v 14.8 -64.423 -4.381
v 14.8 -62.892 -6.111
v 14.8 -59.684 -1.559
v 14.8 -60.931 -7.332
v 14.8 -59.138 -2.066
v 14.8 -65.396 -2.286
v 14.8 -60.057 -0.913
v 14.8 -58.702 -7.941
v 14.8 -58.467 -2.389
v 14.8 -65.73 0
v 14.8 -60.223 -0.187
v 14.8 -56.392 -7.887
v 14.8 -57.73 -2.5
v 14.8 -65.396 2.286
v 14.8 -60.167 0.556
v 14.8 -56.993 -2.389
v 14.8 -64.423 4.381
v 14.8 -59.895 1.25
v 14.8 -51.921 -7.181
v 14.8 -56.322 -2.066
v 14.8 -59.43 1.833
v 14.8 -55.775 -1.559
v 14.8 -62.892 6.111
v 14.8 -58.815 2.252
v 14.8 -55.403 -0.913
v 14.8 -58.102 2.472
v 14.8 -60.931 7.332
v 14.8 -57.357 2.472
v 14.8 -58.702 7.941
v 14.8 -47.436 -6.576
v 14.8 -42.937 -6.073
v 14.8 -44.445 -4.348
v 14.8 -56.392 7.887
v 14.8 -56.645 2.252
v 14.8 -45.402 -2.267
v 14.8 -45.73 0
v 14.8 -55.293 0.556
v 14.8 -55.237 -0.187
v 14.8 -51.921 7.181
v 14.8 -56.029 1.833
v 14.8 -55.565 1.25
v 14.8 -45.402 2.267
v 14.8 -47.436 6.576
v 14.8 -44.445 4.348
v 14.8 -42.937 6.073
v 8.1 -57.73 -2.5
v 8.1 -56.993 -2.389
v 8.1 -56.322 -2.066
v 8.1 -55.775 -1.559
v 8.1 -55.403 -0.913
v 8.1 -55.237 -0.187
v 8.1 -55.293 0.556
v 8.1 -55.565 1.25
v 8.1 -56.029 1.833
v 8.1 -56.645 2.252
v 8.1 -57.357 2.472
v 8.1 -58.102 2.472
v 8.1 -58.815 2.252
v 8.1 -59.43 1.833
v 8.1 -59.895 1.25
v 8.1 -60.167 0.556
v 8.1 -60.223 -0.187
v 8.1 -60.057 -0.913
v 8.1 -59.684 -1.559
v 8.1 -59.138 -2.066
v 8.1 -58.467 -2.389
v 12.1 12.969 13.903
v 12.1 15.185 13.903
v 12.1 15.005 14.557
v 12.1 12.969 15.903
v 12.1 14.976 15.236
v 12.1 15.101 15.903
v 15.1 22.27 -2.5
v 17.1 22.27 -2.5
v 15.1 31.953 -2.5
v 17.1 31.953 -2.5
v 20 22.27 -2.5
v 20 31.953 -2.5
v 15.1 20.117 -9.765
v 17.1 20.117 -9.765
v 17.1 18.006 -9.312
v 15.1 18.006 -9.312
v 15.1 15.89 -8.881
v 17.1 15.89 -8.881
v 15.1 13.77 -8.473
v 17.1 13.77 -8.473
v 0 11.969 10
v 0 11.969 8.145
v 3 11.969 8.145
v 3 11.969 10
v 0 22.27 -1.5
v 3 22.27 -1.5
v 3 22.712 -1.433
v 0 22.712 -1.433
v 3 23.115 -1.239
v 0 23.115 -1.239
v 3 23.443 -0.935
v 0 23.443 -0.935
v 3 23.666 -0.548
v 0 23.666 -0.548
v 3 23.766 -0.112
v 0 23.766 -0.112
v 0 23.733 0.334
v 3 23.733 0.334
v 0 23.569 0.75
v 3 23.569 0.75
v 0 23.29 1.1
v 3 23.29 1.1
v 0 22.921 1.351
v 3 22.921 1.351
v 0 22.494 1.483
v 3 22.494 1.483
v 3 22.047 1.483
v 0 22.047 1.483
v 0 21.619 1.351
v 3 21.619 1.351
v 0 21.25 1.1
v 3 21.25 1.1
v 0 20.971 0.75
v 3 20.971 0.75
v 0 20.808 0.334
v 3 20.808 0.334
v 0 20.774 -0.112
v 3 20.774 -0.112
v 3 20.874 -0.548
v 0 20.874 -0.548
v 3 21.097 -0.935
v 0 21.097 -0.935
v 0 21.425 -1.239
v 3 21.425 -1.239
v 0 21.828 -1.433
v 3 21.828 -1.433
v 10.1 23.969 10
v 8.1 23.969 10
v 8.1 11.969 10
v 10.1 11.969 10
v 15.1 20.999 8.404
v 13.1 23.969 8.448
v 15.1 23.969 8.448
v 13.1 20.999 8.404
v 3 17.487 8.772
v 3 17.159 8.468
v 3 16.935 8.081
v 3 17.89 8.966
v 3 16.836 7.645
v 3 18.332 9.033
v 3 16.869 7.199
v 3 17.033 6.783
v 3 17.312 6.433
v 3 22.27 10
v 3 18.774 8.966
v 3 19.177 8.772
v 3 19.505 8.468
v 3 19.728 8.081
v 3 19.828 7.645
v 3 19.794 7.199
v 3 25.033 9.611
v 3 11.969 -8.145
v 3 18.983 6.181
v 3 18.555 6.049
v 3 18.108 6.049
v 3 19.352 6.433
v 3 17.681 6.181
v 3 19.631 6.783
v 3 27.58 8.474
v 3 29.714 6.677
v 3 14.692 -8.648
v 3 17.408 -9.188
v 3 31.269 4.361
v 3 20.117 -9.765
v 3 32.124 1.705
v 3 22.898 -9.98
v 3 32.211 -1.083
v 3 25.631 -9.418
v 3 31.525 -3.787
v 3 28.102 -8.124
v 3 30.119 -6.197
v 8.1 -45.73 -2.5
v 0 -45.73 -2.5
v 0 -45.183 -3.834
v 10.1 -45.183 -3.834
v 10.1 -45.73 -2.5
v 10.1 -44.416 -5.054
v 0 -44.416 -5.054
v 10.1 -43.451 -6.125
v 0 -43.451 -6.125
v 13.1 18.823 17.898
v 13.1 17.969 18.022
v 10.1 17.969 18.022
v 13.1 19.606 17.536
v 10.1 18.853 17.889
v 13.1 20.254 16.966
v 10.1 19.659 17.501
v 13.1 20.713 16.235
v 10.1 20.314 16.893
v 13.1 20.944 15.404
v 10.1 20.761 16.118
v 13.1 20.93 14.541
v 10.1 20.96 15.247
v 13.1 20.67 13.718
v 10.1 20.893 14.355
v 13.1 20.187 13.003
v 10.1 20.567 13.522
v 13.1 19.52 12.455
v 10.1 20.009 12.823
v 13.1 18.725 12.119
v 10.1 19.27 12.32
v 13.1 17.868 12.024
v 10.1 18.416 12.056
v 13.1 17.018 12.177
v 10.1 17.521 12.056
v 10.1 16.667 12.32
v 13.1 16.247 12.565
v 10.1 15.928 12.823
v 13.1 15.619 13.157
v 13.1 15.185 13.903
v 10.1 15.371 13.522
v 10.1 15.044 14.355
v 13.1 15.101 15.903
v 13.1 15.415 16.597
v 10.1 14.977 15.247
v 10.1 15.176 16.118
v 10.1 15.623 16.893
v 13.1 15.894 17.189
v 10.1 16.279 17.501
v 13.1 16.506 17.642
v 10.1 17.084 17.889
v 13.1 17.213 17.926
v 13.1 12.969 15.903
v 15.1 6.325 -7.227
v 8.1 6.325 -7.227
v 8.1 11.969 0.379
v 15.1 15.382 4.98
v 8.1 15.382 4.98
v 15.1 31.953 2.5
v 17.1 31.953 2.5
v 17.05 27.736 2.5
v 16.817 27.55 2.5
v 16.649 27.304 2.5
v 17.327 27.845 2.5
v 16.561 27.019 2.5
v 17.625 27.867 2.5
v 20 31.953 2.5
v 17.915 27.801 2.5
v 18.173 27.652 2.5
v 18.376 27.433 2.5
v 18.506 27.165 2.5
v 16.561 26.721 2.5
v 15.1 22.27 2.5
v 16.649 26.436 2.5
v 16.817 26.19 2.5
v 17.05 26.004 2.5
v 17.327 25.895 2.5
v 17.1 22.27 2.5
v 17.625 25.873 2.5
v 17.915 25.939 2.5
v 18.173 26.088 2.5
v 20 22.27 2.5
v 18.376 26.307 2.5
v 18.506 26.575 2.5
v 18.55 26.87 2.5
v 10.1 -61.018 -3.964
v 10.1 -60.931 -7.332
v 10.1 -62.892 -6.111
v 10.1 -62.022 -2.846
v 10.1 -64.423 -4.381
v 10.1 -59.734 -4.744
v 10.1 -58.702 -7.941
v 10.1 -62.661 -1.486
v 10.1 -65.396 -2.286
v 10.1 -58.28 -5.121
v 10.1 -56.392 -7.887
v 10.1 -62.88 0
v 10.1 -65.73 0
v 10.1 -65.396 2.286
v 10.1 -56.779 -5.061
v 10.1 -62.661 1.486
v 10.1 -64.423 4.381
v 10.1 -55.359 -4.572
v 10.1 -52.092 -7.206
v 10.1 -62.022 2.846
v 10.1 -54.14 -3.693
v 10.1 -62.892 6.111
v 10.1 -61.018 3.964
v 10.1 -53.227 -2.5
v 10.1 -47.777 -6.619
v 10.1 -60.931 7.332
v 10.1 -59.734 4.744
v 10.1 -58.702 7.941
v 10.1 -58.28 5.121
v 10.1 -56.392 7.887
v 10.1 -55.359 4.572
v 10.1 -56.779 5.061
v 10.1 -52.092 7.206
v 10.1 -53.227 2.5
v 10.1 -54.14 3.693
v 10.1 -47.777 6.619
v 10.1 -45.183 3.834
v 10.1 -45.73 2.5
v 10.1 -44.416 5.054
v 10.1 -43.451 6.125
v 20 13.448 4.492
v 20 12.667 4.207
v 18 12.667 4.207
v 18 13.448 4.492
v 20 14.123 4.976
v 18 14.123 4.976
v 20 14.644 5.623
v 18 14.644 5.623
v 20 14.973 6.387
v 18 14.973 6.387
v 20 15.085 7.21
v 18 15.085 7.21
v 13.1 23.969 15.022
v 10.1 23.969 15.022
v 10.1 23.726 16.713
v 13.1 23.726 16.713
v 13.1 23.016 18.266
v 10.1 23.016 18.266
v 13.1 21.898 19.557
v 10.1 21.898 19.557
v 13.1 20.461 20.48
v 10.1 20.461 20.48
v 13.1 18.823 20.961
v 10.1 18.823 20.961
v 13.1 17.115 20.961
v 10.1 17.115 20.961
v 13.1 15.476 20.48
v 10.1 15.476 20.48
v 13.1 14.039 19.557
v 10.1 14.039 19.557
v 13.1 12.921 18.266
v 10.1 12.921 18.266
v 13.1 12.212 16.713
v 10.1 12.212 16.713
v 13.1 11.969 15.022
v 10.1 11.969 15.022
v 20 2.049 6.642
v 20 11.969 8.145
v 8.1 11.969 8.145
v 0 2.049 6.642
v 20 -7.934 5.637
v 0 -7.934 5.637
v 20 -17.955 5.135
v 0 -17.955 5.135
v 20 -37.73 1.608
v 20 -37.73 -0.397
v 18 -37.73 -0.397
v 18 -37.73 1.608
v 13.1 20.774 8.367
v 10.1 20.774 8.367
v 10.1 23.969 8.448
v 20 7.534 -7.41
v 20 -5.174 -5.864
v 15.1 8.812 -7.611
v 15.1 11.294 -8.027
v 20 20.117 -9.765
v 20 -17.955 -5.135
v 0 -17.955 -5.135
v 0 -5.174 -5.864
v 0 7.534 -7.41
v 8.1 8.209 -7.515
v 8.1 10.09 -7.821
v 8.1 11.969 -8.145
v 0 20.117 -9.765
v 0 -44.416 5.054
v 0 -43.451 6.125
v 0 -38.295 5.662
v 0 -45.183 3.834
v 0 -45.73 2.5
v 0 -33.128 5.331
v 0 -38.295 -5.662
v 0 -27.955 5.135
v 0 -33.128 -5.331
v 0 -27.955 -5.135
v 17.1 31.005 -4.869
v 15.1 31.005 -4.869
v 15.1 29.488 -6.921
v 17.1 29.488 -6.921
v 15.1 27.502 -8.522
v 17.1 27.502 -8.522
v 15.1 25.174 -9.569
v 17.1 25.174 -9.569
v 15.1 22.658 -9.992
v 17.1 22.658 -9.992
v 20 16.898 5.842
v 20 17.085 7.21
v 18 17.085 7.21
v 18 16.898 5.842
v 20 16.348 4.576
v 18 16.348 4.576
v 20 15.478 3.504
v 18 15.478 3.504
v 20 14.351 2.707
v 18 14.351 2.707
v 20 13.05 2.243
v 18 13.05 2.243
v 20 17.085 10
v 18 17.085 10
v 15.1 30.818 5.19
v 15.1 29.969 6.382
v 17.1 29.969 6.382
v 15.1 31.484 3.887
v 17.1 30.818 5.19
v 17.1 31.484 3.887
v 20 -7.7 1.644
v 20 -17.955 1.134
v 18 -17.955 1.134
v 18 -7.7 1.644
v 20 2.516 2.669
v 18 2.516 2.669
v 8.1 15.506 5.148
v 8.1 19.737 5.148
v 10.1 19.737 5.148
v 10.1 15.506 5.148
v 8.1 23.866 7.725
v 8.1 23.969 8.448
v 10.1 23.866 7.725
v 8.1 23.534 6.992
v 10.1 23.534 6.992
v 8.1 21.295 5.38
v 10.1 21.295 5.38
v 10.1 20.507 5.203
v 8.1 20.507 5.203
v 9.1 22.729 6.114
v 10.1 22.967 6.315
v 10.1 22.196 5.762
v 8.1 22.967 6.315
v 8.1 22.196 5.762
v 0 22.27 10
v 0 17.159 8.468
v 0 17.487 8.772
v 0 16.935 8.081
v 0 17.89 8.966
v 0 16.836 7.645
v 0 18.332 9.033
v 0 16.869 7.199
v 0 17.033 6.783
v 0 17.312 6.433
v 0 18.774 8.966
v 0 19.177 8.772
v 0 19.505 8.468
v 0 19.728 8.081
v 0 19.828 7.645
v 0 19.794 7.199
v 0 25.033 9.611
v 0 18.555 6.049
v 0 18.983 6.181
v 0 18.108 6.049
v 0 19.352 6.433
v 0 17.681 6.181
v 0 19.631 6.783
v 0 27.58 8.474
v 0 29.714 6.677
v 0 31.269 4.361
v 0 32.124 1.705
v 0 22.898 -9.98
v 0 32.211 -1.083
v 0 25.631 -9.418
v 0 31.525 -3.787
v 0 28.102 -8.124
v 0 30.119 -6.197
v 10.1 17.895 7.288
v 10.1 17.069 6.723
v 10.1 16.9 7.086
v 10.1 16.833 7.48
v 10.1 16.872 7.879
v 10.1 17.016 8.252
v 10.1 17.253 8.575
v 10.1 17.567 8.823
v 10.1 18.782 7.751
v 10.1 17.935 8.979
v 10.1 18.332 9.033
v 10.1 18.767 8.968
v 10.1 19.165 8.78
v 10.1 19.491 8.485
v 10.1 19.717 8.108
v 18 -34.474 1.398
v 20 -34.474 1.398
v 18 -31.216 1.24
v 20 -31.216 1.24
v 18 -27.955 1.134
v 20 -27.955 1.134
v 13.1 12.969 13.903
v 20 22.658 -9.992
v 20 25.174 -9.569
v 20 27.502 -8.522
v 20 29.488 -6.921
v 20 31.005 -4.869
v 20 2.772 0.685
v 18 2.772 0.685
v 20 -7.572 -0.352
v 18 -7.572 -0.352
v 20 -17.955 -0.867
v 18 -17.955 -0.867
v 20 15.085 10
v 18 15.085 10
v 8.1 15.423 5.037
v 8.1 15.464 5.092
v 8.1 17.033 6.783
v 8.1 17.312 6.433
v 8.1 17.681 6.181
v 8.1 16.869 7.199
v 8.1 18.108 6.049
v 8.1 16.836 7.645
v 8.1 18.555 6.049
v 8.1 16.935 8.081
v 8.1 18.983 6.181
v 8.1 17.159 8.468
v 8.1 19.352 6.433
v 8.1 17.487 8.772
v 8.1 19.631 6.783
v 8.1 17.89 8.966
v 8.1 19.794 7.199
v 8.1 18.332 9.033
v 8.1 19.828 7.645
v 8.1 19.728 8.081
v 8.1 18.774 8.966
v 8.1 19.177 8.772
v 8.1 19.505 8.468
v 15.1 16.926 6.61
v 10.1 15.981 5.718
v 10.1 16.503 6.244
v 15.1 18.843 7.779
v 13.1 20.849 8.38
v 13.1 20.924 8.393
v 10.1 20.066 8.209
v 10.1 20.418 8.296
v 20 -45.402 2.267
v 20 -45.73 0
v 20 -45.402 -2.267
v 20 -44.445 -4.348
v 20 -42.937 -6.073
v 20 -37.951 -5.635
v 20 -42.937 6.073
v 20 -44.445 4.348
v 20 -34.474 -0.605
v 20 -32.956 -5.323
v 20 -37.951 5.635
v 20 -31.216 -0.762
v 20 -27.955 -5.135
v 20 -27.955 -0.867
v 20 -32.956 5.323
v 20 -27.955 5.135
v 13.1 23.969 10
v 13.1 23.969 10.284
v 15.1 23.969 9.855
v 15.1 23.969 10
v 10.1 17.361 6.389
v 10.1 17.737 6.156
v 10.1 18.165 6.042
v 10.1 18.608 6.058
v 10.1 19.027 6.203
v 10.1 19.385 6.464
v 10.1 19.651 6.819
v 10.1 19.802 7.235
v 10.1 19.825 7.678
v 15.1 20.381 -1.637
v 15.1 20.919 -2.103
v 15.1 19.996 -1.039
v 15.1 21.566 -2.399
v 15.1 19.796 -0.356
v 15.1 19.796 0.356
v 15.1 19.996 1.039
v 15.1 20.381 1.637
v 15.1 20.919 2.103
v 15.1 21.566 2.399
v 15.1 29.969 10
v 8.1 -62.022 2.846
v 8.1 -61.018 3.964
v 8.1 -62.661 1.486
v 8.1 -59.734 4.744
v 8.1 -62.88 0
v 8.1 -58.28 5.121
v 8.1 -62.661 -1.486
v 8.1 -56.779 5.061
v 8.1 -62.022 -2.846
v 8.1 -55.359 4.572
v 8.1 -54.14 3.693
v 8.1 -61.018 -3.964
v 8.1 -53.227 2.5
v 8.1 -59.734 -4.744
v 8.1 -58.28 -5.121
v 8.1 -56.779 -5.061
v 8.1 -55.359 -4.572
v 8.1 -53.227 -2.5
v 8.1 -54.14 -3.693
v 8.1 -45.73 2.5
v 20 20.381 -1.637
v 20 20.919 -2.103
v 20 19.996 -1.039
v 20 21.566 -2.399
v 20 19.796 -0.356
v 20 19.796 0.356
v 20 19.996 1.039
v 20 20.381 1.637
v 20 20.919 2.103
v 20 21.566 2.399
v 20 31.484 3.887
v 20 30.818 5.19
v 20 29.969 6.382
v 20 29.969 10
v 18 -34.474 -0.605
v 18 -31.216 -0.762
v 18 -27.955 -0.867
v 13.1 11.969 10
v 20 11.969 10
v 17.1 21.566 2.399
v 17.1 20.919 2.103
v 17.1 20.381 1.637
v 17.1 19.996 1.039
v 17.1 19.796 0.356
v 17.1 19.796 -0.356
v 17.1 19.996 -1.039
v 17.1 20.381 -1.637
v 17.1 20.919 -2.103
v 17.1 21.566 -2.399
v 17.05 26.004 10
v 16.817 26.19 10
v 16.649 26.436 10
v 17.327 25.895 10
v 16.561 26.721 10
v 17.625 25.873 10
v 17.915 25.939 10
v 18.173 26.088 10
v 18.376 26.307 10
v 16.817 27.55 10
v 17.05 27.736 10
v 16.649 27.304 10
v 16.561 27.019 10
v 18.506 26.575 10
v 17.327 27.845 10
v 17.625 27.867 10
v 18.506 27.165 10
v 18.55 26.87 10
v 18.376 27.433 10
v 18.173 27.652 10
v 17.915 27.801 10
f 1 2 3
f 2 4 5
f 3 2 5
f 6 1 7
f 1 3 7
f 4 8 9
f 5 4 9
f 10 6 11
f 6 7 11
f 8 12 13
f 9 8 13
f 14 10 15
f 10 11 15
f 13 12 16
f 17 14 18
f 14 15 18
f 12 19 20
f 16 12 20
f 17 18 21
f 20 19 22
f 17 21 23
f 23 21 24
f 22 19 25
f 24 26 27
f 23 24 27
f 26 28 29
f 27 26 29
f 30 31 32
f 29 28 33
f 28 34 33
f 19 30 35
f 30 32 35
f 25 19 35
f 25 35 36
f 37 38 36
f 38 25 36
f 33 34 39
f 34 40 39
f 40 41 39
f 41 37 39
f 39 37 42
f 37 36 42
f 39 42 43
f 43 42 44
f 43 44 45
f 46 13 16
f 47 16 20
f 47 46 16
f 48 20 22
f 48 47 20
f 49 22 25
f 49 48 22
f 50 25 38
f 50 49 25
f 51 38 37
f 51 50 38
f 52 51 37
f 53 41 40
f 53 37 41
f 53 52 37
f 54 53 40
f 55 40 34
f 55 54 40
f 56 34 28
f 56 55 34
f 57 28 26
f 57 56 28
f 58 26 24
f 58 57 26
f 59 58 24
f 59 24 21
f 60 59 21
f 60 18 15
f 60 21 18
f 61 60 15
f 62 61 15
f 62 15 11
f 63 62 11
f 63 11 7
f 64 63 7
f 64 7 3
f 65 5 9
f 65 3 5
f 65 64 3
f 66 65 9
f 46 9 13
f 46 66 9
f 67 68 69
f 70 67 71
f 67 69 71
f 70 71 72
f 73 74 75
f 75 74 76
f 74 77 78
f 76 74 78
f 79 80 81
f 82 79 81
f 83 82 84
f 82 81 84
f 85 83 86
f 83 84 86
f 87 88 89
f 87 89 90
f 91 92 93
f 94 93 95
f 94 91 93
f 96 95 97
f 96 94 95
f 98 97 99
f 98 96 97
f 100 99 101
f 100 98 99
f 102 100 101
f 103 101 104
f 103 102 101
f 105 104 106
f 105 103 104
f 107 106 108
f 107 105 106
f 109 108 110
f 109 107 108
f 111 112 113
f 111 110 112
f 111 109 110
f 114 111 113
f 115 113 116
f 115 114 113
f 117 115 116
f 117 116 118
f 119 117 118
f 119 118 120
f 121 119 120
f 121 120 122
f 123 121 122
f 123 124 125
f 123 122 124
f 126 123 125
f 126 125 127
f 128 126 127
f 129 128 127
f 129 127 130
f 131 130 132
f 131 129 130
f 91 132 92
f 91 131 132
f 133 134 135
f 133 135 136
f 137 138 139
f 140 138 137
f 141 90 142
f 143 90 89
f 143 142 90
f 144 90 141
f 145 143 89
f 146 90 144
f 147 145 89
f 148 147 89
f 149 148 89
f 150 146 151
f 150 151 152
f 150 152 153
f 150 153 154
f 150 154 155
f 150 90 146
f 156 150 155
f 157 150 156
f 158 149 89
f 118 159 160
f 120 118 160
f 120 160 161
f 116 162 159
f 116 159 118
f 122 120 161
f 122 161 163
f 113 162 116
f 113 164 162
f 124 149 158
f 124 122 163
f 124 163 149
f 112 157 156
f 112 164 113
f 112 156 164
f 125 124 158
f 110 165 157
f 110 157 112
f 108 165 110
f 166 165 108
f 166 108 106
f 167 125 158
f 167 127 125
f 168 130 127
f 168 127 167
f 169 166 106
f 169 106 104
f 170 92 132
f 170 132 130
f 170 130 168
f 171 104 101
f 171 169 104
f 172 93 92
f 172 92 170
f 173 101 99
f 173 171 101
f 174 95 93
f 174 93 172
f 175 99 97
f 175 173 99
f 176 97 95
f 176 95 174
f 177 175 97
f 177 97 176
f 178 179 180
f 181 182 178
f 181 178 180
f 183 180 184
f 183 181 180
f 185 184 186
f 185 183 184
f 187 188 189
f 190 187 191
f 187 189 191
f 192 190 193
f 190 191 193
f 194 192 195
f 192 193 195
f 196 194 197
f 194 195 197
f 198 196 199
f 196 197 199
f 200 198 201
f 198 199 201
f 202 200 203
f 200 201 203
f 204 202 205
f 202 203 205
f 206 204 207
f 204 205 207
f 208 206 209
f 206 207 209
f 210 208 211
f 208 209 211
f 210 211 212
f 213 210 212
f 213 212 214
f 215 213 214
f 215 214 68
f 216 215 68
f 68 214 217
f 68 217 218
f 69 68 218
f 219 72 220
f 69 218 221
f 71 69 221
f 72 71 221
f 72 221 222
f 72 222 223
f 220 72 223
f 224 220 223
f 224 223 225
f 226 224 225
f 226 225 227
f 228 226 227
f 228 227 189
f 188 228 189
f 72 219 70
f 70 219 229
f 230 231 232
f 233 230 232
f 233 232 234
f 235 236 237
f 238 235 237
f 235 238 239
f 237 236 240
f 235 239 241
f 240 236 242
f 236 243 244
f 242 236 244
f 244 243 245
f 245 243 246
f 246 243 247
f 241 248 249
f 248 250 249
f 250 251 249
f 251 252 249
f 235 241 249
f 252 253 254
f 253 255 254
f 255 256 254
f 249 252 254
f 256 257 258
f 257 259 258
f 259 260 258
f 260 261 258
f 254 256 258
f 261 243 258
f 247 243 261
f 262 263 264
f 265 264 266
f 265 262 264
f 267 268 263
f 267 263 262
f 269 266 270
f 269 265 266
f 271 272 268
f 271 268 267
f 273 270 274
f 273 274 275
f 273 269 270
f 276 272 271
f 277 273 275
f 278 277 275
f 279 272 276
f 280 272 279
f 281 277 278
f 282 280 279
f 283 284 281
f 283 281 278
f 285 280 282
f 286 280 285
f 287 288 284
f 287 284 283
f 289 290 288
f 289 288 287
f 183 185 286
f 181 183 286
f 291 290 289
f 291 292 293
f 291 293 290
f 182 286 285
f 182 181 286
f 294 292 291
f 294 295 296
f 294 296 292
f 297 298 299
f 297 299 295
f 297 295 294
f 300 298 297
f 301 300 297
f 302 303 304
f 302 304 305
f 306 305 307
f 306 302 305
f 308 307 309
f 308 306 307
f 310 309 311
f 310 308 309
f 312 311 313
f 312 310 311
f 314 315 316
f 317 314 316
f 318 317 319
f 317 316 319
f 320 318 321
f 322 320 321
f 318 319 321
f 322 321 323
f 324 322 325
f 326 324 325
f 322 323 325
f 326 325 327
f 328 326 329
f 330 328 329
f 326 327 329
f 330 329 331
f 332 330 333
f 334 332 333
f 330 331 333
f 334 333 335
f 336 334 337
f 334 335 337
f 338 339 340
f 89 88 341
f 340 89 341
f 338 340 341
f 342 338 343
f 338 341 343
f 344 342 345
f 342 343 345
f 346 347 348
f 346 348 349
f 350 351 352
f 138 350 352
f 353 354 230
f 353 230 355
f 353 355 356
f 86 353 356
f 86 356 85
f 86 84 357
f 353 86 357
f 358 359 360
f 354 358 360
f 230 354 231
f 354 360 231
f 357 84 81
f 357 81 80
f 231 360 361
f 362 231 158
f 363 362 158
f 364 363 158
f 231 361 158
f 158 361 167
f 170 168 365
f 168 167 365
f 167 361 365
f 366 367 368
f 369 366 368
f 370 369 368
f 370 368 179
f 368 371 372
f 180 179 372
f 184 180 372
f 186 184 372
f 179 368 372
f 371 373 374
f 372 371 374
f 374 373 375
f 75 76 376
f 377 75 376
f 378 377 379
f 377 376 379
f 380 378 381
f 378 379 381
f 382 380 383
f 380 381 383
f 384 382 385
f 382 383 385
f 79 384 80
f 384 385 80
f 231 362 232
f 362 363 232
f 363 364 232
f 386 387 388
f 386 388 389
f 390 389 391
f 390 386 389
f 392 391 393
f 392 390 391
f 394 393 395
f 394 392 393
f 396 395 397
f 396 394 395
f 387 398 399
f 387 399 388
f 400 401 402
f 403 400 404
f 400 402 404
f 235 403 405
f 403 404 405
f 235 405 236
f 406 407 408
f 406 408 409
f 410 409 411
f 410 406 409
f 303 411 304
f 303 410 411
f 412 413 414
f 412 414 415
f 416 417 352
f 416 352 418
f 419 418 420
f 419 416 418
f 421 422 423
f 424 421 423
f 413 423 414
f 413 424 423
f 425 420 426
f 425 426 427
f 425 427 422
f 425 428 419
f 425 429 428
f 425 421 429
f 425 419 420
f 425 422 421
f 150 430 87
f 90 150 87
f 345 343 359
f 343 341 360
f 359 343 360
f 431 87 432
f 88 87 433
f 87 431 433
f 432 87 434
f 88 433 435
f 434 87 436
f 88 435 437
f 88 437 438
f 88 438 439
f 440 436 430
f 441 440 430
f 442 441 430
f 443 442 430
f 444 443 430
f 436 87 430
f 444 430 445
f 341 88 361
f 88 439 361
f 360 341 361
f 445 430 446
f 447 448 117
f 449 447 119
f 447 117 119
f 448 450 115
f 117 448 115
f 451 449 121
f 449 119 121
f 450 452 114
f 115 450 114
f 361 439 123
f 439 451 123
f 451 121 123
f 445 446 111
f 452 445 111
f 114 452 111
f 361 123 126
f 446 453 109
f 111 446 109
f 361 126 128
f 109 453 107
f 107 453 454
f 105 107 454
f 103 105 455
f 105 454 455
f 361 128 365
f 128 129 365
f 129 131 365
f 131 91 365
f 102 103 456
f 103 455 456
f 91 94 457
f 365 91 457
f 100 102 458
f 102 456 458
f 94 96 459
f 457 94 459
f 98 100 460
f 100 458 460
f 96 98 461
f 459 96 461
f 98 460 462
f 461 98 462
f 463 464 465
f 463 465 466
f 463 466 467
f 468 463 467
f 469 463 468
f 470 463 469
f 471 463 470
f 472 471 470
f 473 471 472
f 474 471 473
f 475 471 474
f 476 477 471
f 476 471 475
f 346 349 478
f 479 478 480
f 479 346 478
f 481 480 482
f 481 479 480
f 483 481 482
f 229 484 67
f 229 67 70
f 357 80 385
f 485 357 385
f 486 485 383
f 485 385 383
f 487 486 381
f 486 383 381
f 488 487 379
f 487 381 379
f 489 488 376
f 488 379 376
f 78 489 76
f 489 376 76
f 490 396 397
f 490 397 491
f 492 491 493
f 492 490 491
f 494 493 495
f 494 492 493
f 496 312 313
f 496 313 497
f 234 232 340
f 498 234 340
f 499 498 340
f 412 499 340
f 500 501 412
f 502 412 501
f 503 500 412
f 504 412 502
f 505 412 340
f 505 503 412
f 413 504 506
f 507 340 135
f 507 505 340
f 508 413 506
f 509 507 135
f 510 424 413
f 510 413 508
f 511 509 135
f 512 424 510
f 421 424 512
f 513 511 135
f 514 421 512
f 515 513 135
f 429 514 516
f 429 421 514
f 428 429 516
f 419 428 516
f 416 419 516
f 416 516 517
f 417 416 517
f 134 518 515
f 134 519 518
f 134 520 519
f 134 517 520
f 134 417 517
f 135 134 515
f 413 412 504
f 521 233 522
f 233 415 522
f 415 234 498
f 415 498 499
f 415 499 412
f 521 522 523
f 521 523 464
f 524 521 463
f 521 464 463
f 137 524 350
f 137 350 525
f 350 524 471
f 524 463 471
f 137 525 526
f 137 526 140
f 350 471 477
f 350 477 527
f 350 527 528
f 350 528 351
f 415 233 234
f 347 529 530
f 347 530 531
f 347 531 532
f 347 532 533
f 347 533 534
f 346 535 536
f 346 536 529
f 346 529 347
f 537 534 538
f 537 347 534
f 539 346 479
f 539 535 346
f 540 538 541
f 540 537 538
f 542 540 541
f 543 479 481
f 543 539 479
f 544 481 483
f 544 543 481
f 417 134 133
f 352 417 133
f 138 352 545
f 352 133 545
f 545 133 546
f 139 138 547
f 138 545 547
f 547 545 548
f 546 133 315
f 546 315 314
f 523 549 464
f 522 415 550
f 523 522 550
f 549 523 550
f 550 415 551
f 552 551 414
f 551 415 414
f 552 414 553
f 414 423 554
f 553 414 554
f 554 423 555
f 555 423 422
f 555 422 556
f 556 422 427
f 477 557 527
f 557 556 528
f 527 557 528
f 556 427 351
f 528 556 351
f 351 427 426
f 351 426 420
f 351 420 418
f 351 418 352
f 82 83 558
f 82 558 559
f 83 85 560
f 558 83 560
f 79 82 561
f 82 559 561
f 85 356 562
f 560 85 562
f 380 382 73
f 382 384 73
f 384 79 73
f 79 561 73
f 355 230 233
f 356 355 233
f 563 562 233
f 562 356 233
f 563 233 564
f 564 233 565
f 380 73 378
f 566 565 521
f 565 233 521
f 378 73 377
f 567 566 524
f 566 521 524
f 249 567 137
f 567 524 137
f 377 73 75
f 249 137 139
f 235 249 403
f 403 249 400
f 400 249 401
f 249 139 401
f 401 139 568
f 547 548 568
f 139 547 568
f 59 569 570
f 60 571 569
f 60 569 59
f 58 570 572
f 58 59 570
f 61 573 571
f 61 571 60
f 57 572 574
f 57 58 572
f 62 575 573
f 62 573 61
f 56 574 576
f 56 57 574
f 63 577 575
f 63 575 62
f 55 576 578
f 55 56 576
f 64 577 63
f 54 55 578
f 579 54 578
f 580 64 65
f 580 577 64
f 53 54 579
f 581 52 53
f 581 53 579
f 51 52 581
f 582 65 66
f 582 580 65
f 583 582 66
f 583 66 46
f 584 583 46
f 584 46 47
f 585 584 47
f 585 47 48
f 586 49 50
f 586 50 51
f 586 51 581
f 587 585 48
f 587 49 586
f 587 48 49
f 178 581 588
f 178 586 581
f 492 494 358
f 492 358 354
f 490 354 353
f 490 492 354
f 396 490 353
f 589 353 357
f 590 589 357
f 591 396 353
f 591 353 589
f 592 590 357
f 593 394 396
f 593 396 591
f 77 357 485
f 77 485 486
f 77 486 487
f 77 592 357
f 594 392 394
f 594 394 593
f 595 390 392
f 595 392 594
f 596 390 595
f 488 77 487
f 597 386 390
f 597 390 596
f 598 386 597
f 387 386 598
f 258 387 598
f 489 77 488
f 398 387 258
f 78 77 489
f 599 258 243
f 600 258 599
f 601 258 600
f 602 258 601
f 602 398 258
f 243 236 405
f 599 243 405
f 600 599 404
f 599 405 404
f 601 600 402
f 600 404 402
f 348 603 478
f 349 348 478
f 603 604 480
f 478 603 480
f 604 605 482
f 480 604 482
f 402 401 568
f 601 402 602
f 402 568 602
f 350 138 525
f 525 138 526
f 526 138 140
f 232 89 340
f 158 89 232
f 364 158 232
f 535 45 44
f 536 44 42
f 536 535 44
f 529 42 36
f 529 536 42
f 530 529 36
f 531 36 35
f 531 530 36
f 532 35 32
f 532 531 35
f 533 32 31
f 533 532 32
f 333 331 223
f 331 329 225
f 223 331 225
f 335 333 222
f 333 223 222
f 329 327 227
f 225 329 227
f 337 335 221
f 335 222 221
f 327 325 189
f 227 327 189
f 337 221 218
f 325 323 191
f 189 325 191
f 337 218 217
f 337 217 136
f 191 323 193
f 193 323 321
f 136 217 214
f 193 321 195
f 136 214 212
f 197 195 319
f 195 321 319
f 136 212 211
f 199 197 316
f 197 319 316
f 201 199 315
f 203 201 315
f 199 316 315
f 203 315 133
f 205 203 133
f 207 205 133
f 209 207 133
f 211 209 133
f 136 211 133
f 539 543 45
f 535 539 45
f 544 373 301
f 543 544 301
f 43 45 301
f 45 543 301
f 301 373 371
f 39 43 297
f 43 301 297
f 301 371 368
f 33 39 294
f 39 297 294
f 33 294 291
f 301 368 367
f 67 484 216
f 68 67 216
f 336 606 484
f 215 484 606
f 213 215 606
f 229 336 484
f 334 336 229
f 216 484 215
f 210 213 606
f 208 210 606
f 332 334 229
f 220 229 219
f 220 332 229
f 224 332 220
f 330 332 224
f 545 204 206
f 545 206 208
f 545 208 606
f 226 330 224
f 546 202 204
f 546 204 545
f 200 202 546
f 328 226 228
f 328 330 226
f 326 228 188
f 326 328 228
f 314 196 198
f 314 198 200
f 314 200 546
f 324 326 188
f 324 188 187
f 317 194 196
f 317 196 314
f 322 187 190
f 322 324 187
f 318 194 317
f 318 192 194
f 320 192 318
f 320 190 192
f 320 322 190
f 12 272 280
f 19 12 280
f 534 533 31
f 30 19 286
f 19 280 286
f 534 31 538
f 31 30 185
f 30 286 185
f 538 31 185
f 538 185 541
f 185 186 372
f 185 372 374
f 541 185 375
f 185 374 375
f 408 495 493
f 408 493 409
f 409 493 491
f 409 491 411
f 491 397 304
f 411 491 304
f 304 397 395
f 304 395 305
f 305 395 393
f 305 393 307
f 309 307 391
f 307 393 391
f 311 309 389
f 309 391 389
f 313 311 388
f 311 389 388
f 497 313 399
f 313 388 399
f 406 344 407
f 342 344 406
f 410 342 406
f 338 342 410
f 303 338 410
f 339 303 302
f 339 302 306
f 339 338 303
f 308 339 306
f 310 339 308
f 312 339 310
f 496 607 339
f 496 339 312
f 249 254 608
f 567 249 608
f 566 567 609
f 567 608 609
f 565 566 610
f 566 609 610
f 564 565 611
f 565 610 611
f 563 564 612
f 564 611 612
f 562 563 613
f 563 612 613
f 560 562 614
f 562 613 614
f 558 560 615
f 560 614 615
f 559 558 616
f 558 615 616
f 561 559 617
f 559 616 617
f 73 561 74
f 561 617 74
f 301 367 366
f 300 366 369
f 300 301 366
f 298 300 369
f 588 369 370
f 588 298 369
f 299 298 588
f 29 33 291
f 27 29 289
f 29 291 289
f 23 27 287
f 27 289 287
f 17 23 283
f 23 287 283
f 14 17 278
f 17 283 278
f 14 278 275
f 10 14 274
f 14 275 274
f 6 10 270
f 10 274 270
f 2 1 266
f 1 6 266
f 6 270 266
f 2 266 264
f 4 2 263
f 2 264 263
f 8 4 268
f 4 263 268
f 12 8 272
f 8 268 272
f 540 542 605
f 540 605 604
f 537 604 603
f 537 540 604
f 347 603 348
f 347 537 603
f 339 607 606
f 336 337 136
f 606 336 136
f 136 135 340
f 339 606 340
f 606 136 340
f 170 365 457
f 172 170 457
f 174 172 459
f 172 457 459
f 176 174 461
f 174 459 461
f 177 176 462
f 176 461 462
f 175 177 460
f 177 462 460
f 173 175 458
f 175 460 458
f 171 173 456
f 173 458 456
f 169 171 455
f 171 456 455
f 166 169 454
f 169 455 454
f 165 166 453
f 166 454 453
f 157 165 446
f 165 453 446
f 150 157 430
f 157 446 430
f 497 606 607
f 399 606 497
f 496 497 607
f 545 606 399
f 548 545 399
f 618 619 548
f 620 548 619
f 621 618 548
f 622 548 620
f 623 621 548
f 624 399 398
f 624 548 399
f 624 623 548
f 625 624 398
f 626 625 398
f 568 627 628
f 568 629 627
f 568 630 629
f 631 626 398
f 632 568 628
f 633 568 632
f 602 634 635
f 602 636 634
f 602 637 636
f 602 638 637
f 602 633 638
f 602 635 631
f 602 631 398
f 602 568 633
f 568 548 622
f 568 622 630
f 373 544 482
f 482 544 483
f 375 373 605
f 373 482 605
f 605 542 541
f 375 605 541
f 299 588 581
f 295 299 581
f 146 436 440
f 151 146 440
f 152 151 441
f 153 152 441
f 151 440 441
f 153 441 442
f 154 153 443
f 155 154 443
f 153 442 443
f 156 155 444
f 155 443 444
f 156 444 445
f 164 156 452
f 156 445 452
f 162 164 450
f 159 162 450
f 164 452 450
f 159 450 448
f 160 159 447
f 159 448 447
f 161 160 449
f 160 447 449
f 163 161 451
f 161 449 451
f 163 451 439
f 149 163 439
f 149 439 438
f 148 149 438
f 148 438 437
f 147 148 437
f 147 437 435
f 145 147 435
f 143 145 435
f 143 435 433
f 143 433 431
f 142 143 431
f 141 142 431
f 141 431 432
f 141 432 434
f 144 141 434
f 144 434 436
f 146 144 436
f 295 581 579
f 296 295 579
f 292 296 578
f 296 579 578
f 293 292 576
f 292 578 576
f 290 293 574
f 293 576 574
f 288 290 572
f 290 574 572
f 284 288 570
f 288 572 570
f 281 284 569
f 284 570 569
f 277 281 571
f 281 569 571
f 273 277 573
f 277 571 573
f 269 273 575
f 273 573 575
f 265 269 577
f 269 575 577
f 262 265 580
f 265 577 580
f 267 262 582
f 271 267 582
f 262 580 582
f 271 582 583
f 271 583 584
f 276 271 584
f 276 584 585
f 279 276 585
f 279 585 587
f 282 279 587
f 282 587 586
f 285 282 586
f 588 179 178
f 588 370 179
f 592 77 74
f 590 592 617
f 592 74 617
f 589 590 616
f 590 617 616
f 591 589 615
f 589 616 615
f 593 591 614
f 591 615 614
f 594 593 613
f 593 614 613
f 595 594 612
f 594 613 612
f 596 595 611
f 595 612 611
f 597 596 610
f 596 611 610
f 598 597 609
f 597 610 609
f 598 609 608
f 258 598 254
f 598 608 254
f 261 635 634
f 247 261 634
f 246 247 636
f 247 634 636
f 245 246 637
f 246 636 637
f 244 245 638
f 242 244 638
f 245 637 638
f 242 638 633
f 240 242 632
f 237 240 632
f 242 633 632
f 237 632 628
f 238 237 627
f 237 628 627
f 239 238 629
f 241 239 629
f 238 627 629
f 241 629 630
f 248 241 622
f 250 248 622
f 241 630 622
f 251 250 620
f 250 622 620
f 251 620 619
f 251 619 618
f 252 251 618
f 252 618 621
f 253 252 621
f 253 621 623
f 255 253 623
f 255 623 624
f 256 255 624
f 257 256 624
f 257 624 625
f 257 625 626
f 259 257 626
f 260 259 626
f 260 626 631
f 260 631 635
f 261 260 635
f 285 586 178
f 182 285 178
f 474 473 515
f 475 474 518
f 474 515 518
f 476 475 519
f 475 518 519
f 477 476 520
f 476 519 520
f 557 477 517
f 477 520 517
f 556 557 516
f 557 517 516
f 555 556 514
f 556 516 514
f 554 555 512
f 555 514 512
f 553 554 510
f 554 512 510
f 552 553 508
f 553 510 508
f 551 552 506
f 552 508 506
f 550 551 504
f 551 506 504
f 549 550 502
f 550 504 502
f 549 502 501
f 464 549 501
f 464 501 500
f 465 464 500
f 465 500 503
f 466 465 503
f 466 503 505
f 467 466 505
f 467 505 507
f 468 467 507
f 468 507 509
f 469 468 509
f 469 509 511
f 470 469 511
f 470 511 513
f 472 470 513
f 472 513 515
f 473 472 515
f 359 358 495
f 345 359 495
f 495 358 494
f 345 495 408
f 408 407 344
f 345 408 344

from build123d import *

# Parameters (mm, degrees)
SKETCH1_R                = 1.5
SKETCH1_R_2              = 2.5
BOSS_EXTRUDE1_DEPTH      = 20
SKETCH2_W                = 8.1
SKETCH2_H                = 20
SKETCH2_W_2              = 5.2
SKETCH2_W_3              = 5.1
CUT_EXTRUDE1_DEPTH       = 20
CUT_EXTRUDE1_DEPTH_BACK  = 20
CUT_EXTRUDE2_DEPTH       = 9
BOSS_EXTRUDE2_DEPTH      = 11.9
SKETCH5_R                = 3
BOSS_EXTRUDE3_DEPTH      = 5
CUT_EXTRUDE6_DEPTH       = 1
SKETCH13_R               = 2.5
CUT_EXTRUDE7_DEPTH       = 4
BOSS_EXTRUDE4_DEPTH      = 3
CUT_EXTRUDE9_DEPTH       = 3
SKETCH17_W               = 9
SKETCH17_H               = 3.569322199
CUT_EXTRUDE11_DEPTH      = 3
SKETCH18_W               = 5.770974844
SKETCH18_H               = 0.772936936
BOSS_EXTRUDE5_DEPTH      = 6.9
BOSS_EXTRUDE5_DEPTH_BACK = 1
SKETCH19_W               = 5.1
SKETCH19_H               = 16.397725614
CUT_EXTRUDE12_DEPTH      = 0.301495
SKETCH20_W               = 5
SKETCH20_H               = 12.419235667
CUT_EXTRUDE13_DEPTH      = 10
BOSS_EXTRUDE6_DEPTH      = 2
SKETCH23_W               = 4.9
SKETCH23_H               = 6
BOSS_EXTRUDE7_DEPTH      = 4
SKETCH22_R               = 1
CUT_EXTRUDE15_DEPTH      = 8
BOSS_EXTRUDE8_DEPTH      = 2
SKETCH14_R               = 1.5
CUT_EXTRUDE8_DEPTH       = 10.1
CUT_EXTRUDE17_DEPTH      = 8.1
CUT_EXTRUDE17_DEPTH_BACK = 2
CUT_EXTRUDE18_DEPTH      = 2
CUT_EXTRUDE20_DEPTH      = 5.2
SKETCH30_W               = 6.9
SKETCH30_H               = 20
CUT_EXTRUDE21_DEPTH      = 0.283797
CUT_EXTRUDE22_REACH      = 91.699
SKETCH31_W               = 2
SKETCH31_H               = 11.022421386
CUT_EXTRUDE23_DEPTH      = 7
CUT_EXTRUDE24_DEPTH      = 21


with BuildPart() as part:
    # Sketch1 → Boss-Extrude1 (new body)
    with BuildSketch(Plane(origin=(0, 0, 0), x_dir=(0, 0, -1), z_dir=(1, 0, 0))):
        with BuildLine():
            ThreePointArc((9.765353557, 20.116545894), (0, 32.270117322), (-9.765353557, 20.116545894))
            ThreePointArc((-9.765353557, 20.116545894), (-5.132645827, -18.047253777), (-7.88740095, -56.392382678))
            ThreePointArc((-7.88740095, -56.392382678), (0, -65.729882678), (7.88740095, -56.392382678))
            ThreePointArc((7.88740095, -56.392382678), (5.132645827, -18.047253777), (9.765353557, 20.116545894))
        make_face()
        with Locations((0, 22.270117322)):
            Circle(SKETCH1_R, mode=Mode.SUBTRACT)
        with Locations((0, -57.729882678)):
            Circle(SKETCH1_R_2, mode=Mode.SUBTRACT)
    extrude(amount=BOSS_EXTRUDE1_DEPTH)

    # Sketch2 → Cut-Extrude1 (cut, two sides)
    with BuildSketch(Plane.XY) as cut_extrude1_sk:
        with Locations((4.05, -55.729882678)):
            Rectangle(SKETCH2_W, SKETCH2_H)
        with Locations((17.4, -55.729882678)):
            Rectangle(SKETCH2_W_2, SKETCH2_H)
        with Locations((5.55, 22.270117322)):
            Rectangle(SKETCH2_W_3, SKETCH2_H)
    extrude(amount=CUT_EXTRUDE1_DEPTH, mode=Mode.SUBTRACT)
    extrude(cut_extrude1_sk.sketch, amount=-CUT_EXTRUDE1_DEPTH_BACK, mode=Mode.SUBTRACT)

    # Sketch3 → Cut-Extrude2 (cut)
    with BuildSketch(Plane.ZY.offset(-8.1)):
        with BuildLine():
            Line((8.5, 22.270117322), (8.5, 40.909533312))
            Line((8.5, 40.909533312), (-17.52872033, 40.909533312))
            Line((-17.52872033, 40.909533312), (-17.52872033, 13.770117322))
            Line((-17.52872033, 13.770117322), (0, 13.770117322))
            ThreePointArc((0, 13.770117322), (6.01040764, 16.259709682), (8.5, 22.270117322))
        make_face()
    extrude(amount=-CUT_EXTRUDE2_DEPTH, mode=Mode.SUBTRACT)

    # Sketch4 → Boss-Extrude2 (add, through all)
    with BuildSketch(Plane.ZY.offset(-8.1)):
        Polygon((8.5, 27.537944199), (8.283796844, 12.741558936), (10.283796844, 12.741558936), (10.283796844, 27.537944199), align=None)
    extrude(amount=-BOSS_EXTRUDE2_DEPTH)

    # Sketch5 → Boss-Extrude3 (add)
    with BuildSketch(Plane.ZY.offset(-8.1)):
        with BuildLine():
            Line((8.145156861, 11.968622), (8.447845456, 23.968622))
            Line((8.447845456, 23.968622), (9.854698466, 23.968622))
            Line((9.854698466, 23.968622), (15.022421386, 23.968622))
            ThreePointArc((15.022421386, 23.968622), (21.022421386, 17.968622), (15.022421386, 11.968622))
            Line((15.022421386, 11.968622), (8.145156861, 11.968622))
        make_face()
        with Locations((15.022421386, 17.968622)):
            Circle(SKETCH5_R, mode=Mode.SUBTRACT)
    extrude(amount=-BOSS_EXTRUDE3_DEPTH)

    # Sketch12 → Cut-Extrude6 (cut)
    with BuildSketch(Plane(origin=(13.1, 0, 0), x_dir=(0, 0, -1), z_dir=(1, 0, 0))):
        Polygon((-13.902900694, 14.968622), (-13.902900694, 12.968622), (-15.902900694, 12.968622), (-15.902900694, 14.968622), (-15.902900694, 15.294296094), (-13.902900694, 15.294296094), align=None)
    extrude(amount=-CUT_EXTRUDE6_DEPTH, mode=Mode.SUBTRACT)

    # Sketch13 → Cut-Extrude7 (cut)
    with BuildSketch(Plane.ZY.offset(-17.1)):
        with Locations((0, 22.270117322)):
            Circle(SKETCH13_R)
    extrude(amount=-CUT_EXTRUDE7_DEPTH, mode=Mode.SUBTRACT)

    # Sketch15 → Boss-Extrude4 (add)
    with BuildSketch(Plane.ZY):
        Polygon((10, 22.270117322), (10, 11.968622), (8.145156861, 11.968622), (7.595672539, 11.968622), align=None)
    extrude(amount=-BOSS_EXTRUDE4_DEPTH)

    # Sketch16 → Cut-Extrude9 (cut)
    with BuildSketch(Plane(origin=(20, 0, 0), x_dir=(0, 0, -1), z_dir=(1, 0, 0))):
        with BuildLine():
            Line((-10.283796844, 23.968622), (-9.854698466, 23.968622))
            ThreePointArc((-9.854698466, 23.968622), (-9.349264901, 25.818531871), (-8.5, 27.537944199))
            Line((-8.5, 27.537944199), (-10.283796844, 27.537944199))
            Line((-10.283796844, 27.537944199), (-10.283796844, 23.968622))
        make_face()
    extrude(amount=-CUT_EXTRUDE9_DEPTH, mode=Mode.SUBTRACT)

    # Sketch17 → Cut-Extrude11 (cut)
    with BuildSketch(Plane.XY.offset(10.283796844)):
        with Locations((12.6, 25.7532831)):
            Rectangle(SKETCH17_W, SKETCH17_H)
    extrude(amount=-CUT_EXTRUDE11_DEPTH, mode=Mode.SUBTRACT)

    # Sketch18 → Boss-Extrude5 (add, two sides)
    with BuildSketch(Plane(origin=(13.1, 0, 0), x_dir=(0, 0, -1), z_dir=(1, 0, 0))) as boss_extrude5_sk:
        with Locations((-7.398309422, 12.355090468)):
            Rectangle(SKETCH18_W, SKETCH18_H)
    extrude(amount=BOSS_EXTRUDE5_DEPTH)
    extrude(boss_extrude5_sk.sketch, amount=-BOSS_EXTRUDE5_DEPTH_BACK)

    # Sketch19 → Cut-Extrude12 (cut)
    with BuildSketch(Plane(origin=(0, 12.270117322, 0), x_dir=(1, 0, 0), z_dir=(0, 1, 0))):
        with Locations((5.55, 0)):
            Rectangle(SKETCH19_W, SKETCH19_H)
    extrude(amount=-CUT_EXTRUDE12_DEPTH, mode=Mode.SUBTRACT)

    # Sketch20 → Cut-Extrude13 (cut)
    with BuildSketch(Plane.ZY.offset(-17.1)):
        with Locations((0, 28.479735156)):
            Rectangle(SKETCH20_W, SKETCH20_H)
    extrude(amount=-CUT_EXTRUDE13_DEPTH, mode=Mode.SUBTRACT)

    # Sketch21 → Boss-Extrude6 (add)
    with BuildSketch(Plane.ZY.offset(-17.1)):
        with BuildLine():
            Line((-8.473151119, 13.770117322), (0.278481736, 12.273995678))
            ThreePointArc((0.278481736, 12.273995678), (9.936881703, 21.148341047), (2.5, 31.952575688))
            Line((2.5, 31.952575688), (2.5, 22.270117322))
            ThreePointArc((2.5, 22.270117322), (0, 19.770117322), (-2.5, 22.270117322))
            Line((-2.5, 22.270117322), (-2.5, 31.952575688))
            ThreePointArc((-2.5, 31.952575688), (-8.522477621, 27.501501002), (-9.765353557, 20.116545894))
            ThreePointArc((-9.765353557, 20.116545894), (-9.093560923, 16.948562662), (-8.473151119, 13.770117322))
        make_face()
    extrude(amount=BOSS_EXTRUDE6_DEPTH)

    # Sketch23 → Boss-Extrude7 (add)
    with BuildSketch(Plane.XY.offset(10.283796844)):
        with Locations((17.55, 26.968622)):
            Rectangle(SKETCH23_W, SKETCH23_H)
    extrude(amount=-BOSS_EXTRUDE7_DEPTH)

    # Sketch22 → Cut-Extrude15 (cut)
    with BuildSketch(Plane.XY.offset(10.283796844)):
        with Locations((17.55, 26.870117322)):
            Circle(SKETCH22_R)
    extrude(amount=-CUT_EXTRUDE15_DEPTH, mode=Mode.SUBTRACT)

    # Sketch24 → Boss-Extrude8 (add)
    with BuildSketch(Plane.ZY.offset(-8.1)):
        with BuildLine():
            Line((5.147845456, 19.737443909), (5.147845456, 15.506265819))
            Line((5.147845456, 15.506265819), (8.447845456, 15.506265819))
            Line((8.447845456, 15.506265819), (8.447845456, 23.968622))
            add(Edge.make_bspline(
                [(8.447845456, 23.968622), (5.147845456, 23.968622), (5.147845456, 19.737443909)],
                knots=[3.141592654, 3.141592654, 3.141592654, 4.71238898, 4.71238898, 4.71238898], degree=2, weights=[1, 0.707106781, 1]))
        make_face()
    extrude(amount=-BOSS_EXTRUDE8_DEPTH)

    # Sketch14 → Cut-Extrude8 (cut)
    with BuildSketch(Plane.ZY):
        with Locations((7.532575614, 18.331804915)):
            Circle(SKETCH14_R)
    extrude(amount=-CUT_EXTRUDE8_DEPTH, mode=Mode.SUBTRACT)

    # Sketch25 → Cut-Extrude17 (cut, two sides)
    with BuildSketch(Plane.ZY.offset(-8.1)) as cut_extrude17_sk:
        with BuildLine():
            Line((12, -45.729882678), (8.346153846, -36.960651908))
            ThreePointArc((8.346153846, -36.960651908), (6.973852263, -42.37911752), (2.5, -45.729882678))
            Line((2.5, -45.729882678), (2.5, -53.227383372))
            ThreePointArc((2.5, -53.227383372), (0, -62.879882678), (-2.5, -53.227383372))
            Line((-2.5, -53.227383372), (-2.5, -45.729882678))
            ThreePointArc((-2.5, -45.729882678), (-6.973852263, -42.37911752), (-8.346153846, -36.960651908))
            Line((-8.346153846, -36.960651908), (-12, -45.729882678))
            Line((-12, -45.729882678), (-12, -57.729882678))
            ThreePointArc((-12, -57.729882678), (0, -69.729882678), (12, -57.729882678))
            Line((12, -57.729882678), (12, -45.729882678))
        make_face()
    extrude(amount=CUT_EXTRUDE17_DEPTH, mode=Mode.SUBTRACT)
    extrude(cut_extrude17_sk.sketch, amount=-CUT_EXTRUDE17_DEPTH_BACK, mode=Mode.SUBTRACT)

    # Sketch26 → Cut-Extrude18 (cut)
    with BuildSketch(Plane(origin=(20, 0, 0), x_dir=(0, 0, -1), z_dir=(1, 0, 0))):
        with BuildLine():
            Line((-7.209968303, 15.085404497), (-10.283796844, 15.085404497))
            Line((-10.283796844, 15.085404497), (-10.283796844, 17.085404497))
            Line((-10.283796844, 17.085404497), (-7.209968303, 17.085404497))
            ThreePointArc((-7.209968303, 17.085404497), (-4.010444351, 15.949526558), (-2.243391617, 13.050441039))
            ThreePointArc((-2.243391617, 13.050441039), (0.649659998, -12.257973546), (0.397031114, -37.729953741))
            Line((0.397031114, -37.729953741), (-1.608183929, -37.729953741))
            ThreePointArc((-1.608183929, -37.729953741), (-1.343036313, -12.450773719), (-4.206611504, 12.667092093))
            ThreePointArc((-4.206611504, 12.667092093), (-5.281990934, 14.405678614), (-7.209968303, 15.085404497))
        make_face()
    extrude(amount=-CUT_EXTRUDE18_DEPTH, mode=Mode.SUBTRACT)

    # Sketch29 → Cut-Extrude20 (cut)
    with BuildSketch(Plane(origin=(20, 0, 0), x_dir=(0, 0, -1), z_dir=(1, 0, 0))):
        with BuildLine():
            Line((8, -37.729882678), (8.140336581, -37.729882678))
            Line((8.140336581, -37.729882678), (8.140336581, -45.937498976))
            Line((8.140336581, -45.937498976), (-15.754893946, -45.937498976))
            Line((-15.754893946, -45.937498976), (-15.754893946, -37.729882678))
            Line((-15.754893946, -37.729882678), (-8, -37.729882678))
            ThreePointArc((-8, -37.729882678), (0, -45.729882678), (8, -37.729882678))
        make_face()
    extrude(amount=-CUT_EXTRUDE20_DEPTH, mode=Mode.SUBTRACT)

    # Sketch30 → Cut-Extrude21 (cut)
    with BuildSketch(Plane.XY.offset(10.283796844)):
        with Locations((16.55, 21.968622)):
            Rectangle(SKETCH30_W, SKETCH30_H)
    extrude(amount=-CUT_EXTRUDE21_DEPTH, mode=Mode.SUBTRACT)

    # Sketch31 → Cut-Extrude22 (cut, up to next)
    with BuildSketch(Plane(origin=(0, 23.968622, 0), x_dir=(1, 0, 0), z_dir=(0, 1, 0)), mode=Mode.PRIVATE) as cut_extrude22_sk1:
        with Locations((9.1, -15.511210693)):
            Rectangle(SKETCH31_W, SKETCH31_H)
    cut_extrude22_tool1 = extrude(cut_extrude22_sk1.sketch, amount=-CUT_EXTRUDE22_REACH, mode=Mode.PRIVATE) & part.part
    add(cut_extrude22_tool1.solids().sort_by_distance((9.1, 23.968622, 15.511211))[0], mode=Mode.SUBTRACT)

    # Sketch32 → Cut-Extrude23 (cut)
    with BuildSketch(Plane.ZY.offset(-8.1)):
        Polygon((-8.473151119, 13.770117322), (-8.473151119, 5.401068454), (5.147845456, 15.506265819), align=None)
    extrude(amount=-CUT_EXTRUDE23_DEPTH, mode=Mode.SUBTRACT)

    # Sketch33 → Cut-Extrude24 (cut, through all)
    with BuildSketch(Plane(origin=(20, 0, 0), x_dir=(0, 0, -1), z_dir=(1, 0, 0))):
        Polygon((-9.30475326, -22.954882678), (-9.30475326, -27.954882678), (8.892389241, -27.954882678), (8.892389241, -22.954882678), (8.892389241, -17.954882678), (-9.30475326, -17.954882678), align=None)
    extrude(amount=-CUT_EXTRUDE24_DEPTH, mode=Mode.SUBTRACT)


solid = part.part
